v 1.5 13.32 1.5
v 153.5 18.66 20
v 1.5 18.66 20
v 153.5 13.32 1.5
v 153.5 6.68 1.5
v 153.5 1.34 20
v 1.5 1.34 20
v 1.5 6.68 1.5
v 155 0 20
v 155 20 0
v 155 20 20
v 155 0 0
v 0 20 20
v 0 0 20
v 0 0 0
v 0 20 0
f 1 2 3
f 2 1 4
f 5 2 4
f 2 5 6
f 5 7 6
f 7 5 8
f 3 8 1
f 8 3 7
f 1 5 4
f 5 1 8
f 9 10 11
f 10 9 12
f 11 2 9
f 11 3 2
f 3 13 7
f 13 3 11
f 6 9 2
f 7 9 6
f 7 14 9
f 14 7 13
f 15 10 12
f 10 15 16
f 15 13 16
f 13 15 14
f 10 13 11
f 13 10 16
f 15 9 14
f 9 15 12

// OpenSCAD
x = 155;
y = 20;
z = 20;
t = 3;
m=t/2;

module one() {
    difference() {
        cube([x, y, z]);
        difference() {
            translate([t/2, y/2, z*1]) scale([1, 0.75, 1.5]) rotate([0, 90, 0]) cylinder(x-t, y , y, $fn=3);
            cube([x ,y, t/2]);
            translate([0, 0, -z]) cube([x, y, z]);
        }
    }
}

module two() {
    difference() {
        cube([x, y, z]);
        translate([(t+m)/2, (t+m)/2, t/2]) {
            $fn=50;
            rotate([0, 0, 0]) minkowski() {
                cube([x-t-m, y-t-m, z+t/2]);
                cylinder(m);
            }
        }
    }
}

one();
//two();
